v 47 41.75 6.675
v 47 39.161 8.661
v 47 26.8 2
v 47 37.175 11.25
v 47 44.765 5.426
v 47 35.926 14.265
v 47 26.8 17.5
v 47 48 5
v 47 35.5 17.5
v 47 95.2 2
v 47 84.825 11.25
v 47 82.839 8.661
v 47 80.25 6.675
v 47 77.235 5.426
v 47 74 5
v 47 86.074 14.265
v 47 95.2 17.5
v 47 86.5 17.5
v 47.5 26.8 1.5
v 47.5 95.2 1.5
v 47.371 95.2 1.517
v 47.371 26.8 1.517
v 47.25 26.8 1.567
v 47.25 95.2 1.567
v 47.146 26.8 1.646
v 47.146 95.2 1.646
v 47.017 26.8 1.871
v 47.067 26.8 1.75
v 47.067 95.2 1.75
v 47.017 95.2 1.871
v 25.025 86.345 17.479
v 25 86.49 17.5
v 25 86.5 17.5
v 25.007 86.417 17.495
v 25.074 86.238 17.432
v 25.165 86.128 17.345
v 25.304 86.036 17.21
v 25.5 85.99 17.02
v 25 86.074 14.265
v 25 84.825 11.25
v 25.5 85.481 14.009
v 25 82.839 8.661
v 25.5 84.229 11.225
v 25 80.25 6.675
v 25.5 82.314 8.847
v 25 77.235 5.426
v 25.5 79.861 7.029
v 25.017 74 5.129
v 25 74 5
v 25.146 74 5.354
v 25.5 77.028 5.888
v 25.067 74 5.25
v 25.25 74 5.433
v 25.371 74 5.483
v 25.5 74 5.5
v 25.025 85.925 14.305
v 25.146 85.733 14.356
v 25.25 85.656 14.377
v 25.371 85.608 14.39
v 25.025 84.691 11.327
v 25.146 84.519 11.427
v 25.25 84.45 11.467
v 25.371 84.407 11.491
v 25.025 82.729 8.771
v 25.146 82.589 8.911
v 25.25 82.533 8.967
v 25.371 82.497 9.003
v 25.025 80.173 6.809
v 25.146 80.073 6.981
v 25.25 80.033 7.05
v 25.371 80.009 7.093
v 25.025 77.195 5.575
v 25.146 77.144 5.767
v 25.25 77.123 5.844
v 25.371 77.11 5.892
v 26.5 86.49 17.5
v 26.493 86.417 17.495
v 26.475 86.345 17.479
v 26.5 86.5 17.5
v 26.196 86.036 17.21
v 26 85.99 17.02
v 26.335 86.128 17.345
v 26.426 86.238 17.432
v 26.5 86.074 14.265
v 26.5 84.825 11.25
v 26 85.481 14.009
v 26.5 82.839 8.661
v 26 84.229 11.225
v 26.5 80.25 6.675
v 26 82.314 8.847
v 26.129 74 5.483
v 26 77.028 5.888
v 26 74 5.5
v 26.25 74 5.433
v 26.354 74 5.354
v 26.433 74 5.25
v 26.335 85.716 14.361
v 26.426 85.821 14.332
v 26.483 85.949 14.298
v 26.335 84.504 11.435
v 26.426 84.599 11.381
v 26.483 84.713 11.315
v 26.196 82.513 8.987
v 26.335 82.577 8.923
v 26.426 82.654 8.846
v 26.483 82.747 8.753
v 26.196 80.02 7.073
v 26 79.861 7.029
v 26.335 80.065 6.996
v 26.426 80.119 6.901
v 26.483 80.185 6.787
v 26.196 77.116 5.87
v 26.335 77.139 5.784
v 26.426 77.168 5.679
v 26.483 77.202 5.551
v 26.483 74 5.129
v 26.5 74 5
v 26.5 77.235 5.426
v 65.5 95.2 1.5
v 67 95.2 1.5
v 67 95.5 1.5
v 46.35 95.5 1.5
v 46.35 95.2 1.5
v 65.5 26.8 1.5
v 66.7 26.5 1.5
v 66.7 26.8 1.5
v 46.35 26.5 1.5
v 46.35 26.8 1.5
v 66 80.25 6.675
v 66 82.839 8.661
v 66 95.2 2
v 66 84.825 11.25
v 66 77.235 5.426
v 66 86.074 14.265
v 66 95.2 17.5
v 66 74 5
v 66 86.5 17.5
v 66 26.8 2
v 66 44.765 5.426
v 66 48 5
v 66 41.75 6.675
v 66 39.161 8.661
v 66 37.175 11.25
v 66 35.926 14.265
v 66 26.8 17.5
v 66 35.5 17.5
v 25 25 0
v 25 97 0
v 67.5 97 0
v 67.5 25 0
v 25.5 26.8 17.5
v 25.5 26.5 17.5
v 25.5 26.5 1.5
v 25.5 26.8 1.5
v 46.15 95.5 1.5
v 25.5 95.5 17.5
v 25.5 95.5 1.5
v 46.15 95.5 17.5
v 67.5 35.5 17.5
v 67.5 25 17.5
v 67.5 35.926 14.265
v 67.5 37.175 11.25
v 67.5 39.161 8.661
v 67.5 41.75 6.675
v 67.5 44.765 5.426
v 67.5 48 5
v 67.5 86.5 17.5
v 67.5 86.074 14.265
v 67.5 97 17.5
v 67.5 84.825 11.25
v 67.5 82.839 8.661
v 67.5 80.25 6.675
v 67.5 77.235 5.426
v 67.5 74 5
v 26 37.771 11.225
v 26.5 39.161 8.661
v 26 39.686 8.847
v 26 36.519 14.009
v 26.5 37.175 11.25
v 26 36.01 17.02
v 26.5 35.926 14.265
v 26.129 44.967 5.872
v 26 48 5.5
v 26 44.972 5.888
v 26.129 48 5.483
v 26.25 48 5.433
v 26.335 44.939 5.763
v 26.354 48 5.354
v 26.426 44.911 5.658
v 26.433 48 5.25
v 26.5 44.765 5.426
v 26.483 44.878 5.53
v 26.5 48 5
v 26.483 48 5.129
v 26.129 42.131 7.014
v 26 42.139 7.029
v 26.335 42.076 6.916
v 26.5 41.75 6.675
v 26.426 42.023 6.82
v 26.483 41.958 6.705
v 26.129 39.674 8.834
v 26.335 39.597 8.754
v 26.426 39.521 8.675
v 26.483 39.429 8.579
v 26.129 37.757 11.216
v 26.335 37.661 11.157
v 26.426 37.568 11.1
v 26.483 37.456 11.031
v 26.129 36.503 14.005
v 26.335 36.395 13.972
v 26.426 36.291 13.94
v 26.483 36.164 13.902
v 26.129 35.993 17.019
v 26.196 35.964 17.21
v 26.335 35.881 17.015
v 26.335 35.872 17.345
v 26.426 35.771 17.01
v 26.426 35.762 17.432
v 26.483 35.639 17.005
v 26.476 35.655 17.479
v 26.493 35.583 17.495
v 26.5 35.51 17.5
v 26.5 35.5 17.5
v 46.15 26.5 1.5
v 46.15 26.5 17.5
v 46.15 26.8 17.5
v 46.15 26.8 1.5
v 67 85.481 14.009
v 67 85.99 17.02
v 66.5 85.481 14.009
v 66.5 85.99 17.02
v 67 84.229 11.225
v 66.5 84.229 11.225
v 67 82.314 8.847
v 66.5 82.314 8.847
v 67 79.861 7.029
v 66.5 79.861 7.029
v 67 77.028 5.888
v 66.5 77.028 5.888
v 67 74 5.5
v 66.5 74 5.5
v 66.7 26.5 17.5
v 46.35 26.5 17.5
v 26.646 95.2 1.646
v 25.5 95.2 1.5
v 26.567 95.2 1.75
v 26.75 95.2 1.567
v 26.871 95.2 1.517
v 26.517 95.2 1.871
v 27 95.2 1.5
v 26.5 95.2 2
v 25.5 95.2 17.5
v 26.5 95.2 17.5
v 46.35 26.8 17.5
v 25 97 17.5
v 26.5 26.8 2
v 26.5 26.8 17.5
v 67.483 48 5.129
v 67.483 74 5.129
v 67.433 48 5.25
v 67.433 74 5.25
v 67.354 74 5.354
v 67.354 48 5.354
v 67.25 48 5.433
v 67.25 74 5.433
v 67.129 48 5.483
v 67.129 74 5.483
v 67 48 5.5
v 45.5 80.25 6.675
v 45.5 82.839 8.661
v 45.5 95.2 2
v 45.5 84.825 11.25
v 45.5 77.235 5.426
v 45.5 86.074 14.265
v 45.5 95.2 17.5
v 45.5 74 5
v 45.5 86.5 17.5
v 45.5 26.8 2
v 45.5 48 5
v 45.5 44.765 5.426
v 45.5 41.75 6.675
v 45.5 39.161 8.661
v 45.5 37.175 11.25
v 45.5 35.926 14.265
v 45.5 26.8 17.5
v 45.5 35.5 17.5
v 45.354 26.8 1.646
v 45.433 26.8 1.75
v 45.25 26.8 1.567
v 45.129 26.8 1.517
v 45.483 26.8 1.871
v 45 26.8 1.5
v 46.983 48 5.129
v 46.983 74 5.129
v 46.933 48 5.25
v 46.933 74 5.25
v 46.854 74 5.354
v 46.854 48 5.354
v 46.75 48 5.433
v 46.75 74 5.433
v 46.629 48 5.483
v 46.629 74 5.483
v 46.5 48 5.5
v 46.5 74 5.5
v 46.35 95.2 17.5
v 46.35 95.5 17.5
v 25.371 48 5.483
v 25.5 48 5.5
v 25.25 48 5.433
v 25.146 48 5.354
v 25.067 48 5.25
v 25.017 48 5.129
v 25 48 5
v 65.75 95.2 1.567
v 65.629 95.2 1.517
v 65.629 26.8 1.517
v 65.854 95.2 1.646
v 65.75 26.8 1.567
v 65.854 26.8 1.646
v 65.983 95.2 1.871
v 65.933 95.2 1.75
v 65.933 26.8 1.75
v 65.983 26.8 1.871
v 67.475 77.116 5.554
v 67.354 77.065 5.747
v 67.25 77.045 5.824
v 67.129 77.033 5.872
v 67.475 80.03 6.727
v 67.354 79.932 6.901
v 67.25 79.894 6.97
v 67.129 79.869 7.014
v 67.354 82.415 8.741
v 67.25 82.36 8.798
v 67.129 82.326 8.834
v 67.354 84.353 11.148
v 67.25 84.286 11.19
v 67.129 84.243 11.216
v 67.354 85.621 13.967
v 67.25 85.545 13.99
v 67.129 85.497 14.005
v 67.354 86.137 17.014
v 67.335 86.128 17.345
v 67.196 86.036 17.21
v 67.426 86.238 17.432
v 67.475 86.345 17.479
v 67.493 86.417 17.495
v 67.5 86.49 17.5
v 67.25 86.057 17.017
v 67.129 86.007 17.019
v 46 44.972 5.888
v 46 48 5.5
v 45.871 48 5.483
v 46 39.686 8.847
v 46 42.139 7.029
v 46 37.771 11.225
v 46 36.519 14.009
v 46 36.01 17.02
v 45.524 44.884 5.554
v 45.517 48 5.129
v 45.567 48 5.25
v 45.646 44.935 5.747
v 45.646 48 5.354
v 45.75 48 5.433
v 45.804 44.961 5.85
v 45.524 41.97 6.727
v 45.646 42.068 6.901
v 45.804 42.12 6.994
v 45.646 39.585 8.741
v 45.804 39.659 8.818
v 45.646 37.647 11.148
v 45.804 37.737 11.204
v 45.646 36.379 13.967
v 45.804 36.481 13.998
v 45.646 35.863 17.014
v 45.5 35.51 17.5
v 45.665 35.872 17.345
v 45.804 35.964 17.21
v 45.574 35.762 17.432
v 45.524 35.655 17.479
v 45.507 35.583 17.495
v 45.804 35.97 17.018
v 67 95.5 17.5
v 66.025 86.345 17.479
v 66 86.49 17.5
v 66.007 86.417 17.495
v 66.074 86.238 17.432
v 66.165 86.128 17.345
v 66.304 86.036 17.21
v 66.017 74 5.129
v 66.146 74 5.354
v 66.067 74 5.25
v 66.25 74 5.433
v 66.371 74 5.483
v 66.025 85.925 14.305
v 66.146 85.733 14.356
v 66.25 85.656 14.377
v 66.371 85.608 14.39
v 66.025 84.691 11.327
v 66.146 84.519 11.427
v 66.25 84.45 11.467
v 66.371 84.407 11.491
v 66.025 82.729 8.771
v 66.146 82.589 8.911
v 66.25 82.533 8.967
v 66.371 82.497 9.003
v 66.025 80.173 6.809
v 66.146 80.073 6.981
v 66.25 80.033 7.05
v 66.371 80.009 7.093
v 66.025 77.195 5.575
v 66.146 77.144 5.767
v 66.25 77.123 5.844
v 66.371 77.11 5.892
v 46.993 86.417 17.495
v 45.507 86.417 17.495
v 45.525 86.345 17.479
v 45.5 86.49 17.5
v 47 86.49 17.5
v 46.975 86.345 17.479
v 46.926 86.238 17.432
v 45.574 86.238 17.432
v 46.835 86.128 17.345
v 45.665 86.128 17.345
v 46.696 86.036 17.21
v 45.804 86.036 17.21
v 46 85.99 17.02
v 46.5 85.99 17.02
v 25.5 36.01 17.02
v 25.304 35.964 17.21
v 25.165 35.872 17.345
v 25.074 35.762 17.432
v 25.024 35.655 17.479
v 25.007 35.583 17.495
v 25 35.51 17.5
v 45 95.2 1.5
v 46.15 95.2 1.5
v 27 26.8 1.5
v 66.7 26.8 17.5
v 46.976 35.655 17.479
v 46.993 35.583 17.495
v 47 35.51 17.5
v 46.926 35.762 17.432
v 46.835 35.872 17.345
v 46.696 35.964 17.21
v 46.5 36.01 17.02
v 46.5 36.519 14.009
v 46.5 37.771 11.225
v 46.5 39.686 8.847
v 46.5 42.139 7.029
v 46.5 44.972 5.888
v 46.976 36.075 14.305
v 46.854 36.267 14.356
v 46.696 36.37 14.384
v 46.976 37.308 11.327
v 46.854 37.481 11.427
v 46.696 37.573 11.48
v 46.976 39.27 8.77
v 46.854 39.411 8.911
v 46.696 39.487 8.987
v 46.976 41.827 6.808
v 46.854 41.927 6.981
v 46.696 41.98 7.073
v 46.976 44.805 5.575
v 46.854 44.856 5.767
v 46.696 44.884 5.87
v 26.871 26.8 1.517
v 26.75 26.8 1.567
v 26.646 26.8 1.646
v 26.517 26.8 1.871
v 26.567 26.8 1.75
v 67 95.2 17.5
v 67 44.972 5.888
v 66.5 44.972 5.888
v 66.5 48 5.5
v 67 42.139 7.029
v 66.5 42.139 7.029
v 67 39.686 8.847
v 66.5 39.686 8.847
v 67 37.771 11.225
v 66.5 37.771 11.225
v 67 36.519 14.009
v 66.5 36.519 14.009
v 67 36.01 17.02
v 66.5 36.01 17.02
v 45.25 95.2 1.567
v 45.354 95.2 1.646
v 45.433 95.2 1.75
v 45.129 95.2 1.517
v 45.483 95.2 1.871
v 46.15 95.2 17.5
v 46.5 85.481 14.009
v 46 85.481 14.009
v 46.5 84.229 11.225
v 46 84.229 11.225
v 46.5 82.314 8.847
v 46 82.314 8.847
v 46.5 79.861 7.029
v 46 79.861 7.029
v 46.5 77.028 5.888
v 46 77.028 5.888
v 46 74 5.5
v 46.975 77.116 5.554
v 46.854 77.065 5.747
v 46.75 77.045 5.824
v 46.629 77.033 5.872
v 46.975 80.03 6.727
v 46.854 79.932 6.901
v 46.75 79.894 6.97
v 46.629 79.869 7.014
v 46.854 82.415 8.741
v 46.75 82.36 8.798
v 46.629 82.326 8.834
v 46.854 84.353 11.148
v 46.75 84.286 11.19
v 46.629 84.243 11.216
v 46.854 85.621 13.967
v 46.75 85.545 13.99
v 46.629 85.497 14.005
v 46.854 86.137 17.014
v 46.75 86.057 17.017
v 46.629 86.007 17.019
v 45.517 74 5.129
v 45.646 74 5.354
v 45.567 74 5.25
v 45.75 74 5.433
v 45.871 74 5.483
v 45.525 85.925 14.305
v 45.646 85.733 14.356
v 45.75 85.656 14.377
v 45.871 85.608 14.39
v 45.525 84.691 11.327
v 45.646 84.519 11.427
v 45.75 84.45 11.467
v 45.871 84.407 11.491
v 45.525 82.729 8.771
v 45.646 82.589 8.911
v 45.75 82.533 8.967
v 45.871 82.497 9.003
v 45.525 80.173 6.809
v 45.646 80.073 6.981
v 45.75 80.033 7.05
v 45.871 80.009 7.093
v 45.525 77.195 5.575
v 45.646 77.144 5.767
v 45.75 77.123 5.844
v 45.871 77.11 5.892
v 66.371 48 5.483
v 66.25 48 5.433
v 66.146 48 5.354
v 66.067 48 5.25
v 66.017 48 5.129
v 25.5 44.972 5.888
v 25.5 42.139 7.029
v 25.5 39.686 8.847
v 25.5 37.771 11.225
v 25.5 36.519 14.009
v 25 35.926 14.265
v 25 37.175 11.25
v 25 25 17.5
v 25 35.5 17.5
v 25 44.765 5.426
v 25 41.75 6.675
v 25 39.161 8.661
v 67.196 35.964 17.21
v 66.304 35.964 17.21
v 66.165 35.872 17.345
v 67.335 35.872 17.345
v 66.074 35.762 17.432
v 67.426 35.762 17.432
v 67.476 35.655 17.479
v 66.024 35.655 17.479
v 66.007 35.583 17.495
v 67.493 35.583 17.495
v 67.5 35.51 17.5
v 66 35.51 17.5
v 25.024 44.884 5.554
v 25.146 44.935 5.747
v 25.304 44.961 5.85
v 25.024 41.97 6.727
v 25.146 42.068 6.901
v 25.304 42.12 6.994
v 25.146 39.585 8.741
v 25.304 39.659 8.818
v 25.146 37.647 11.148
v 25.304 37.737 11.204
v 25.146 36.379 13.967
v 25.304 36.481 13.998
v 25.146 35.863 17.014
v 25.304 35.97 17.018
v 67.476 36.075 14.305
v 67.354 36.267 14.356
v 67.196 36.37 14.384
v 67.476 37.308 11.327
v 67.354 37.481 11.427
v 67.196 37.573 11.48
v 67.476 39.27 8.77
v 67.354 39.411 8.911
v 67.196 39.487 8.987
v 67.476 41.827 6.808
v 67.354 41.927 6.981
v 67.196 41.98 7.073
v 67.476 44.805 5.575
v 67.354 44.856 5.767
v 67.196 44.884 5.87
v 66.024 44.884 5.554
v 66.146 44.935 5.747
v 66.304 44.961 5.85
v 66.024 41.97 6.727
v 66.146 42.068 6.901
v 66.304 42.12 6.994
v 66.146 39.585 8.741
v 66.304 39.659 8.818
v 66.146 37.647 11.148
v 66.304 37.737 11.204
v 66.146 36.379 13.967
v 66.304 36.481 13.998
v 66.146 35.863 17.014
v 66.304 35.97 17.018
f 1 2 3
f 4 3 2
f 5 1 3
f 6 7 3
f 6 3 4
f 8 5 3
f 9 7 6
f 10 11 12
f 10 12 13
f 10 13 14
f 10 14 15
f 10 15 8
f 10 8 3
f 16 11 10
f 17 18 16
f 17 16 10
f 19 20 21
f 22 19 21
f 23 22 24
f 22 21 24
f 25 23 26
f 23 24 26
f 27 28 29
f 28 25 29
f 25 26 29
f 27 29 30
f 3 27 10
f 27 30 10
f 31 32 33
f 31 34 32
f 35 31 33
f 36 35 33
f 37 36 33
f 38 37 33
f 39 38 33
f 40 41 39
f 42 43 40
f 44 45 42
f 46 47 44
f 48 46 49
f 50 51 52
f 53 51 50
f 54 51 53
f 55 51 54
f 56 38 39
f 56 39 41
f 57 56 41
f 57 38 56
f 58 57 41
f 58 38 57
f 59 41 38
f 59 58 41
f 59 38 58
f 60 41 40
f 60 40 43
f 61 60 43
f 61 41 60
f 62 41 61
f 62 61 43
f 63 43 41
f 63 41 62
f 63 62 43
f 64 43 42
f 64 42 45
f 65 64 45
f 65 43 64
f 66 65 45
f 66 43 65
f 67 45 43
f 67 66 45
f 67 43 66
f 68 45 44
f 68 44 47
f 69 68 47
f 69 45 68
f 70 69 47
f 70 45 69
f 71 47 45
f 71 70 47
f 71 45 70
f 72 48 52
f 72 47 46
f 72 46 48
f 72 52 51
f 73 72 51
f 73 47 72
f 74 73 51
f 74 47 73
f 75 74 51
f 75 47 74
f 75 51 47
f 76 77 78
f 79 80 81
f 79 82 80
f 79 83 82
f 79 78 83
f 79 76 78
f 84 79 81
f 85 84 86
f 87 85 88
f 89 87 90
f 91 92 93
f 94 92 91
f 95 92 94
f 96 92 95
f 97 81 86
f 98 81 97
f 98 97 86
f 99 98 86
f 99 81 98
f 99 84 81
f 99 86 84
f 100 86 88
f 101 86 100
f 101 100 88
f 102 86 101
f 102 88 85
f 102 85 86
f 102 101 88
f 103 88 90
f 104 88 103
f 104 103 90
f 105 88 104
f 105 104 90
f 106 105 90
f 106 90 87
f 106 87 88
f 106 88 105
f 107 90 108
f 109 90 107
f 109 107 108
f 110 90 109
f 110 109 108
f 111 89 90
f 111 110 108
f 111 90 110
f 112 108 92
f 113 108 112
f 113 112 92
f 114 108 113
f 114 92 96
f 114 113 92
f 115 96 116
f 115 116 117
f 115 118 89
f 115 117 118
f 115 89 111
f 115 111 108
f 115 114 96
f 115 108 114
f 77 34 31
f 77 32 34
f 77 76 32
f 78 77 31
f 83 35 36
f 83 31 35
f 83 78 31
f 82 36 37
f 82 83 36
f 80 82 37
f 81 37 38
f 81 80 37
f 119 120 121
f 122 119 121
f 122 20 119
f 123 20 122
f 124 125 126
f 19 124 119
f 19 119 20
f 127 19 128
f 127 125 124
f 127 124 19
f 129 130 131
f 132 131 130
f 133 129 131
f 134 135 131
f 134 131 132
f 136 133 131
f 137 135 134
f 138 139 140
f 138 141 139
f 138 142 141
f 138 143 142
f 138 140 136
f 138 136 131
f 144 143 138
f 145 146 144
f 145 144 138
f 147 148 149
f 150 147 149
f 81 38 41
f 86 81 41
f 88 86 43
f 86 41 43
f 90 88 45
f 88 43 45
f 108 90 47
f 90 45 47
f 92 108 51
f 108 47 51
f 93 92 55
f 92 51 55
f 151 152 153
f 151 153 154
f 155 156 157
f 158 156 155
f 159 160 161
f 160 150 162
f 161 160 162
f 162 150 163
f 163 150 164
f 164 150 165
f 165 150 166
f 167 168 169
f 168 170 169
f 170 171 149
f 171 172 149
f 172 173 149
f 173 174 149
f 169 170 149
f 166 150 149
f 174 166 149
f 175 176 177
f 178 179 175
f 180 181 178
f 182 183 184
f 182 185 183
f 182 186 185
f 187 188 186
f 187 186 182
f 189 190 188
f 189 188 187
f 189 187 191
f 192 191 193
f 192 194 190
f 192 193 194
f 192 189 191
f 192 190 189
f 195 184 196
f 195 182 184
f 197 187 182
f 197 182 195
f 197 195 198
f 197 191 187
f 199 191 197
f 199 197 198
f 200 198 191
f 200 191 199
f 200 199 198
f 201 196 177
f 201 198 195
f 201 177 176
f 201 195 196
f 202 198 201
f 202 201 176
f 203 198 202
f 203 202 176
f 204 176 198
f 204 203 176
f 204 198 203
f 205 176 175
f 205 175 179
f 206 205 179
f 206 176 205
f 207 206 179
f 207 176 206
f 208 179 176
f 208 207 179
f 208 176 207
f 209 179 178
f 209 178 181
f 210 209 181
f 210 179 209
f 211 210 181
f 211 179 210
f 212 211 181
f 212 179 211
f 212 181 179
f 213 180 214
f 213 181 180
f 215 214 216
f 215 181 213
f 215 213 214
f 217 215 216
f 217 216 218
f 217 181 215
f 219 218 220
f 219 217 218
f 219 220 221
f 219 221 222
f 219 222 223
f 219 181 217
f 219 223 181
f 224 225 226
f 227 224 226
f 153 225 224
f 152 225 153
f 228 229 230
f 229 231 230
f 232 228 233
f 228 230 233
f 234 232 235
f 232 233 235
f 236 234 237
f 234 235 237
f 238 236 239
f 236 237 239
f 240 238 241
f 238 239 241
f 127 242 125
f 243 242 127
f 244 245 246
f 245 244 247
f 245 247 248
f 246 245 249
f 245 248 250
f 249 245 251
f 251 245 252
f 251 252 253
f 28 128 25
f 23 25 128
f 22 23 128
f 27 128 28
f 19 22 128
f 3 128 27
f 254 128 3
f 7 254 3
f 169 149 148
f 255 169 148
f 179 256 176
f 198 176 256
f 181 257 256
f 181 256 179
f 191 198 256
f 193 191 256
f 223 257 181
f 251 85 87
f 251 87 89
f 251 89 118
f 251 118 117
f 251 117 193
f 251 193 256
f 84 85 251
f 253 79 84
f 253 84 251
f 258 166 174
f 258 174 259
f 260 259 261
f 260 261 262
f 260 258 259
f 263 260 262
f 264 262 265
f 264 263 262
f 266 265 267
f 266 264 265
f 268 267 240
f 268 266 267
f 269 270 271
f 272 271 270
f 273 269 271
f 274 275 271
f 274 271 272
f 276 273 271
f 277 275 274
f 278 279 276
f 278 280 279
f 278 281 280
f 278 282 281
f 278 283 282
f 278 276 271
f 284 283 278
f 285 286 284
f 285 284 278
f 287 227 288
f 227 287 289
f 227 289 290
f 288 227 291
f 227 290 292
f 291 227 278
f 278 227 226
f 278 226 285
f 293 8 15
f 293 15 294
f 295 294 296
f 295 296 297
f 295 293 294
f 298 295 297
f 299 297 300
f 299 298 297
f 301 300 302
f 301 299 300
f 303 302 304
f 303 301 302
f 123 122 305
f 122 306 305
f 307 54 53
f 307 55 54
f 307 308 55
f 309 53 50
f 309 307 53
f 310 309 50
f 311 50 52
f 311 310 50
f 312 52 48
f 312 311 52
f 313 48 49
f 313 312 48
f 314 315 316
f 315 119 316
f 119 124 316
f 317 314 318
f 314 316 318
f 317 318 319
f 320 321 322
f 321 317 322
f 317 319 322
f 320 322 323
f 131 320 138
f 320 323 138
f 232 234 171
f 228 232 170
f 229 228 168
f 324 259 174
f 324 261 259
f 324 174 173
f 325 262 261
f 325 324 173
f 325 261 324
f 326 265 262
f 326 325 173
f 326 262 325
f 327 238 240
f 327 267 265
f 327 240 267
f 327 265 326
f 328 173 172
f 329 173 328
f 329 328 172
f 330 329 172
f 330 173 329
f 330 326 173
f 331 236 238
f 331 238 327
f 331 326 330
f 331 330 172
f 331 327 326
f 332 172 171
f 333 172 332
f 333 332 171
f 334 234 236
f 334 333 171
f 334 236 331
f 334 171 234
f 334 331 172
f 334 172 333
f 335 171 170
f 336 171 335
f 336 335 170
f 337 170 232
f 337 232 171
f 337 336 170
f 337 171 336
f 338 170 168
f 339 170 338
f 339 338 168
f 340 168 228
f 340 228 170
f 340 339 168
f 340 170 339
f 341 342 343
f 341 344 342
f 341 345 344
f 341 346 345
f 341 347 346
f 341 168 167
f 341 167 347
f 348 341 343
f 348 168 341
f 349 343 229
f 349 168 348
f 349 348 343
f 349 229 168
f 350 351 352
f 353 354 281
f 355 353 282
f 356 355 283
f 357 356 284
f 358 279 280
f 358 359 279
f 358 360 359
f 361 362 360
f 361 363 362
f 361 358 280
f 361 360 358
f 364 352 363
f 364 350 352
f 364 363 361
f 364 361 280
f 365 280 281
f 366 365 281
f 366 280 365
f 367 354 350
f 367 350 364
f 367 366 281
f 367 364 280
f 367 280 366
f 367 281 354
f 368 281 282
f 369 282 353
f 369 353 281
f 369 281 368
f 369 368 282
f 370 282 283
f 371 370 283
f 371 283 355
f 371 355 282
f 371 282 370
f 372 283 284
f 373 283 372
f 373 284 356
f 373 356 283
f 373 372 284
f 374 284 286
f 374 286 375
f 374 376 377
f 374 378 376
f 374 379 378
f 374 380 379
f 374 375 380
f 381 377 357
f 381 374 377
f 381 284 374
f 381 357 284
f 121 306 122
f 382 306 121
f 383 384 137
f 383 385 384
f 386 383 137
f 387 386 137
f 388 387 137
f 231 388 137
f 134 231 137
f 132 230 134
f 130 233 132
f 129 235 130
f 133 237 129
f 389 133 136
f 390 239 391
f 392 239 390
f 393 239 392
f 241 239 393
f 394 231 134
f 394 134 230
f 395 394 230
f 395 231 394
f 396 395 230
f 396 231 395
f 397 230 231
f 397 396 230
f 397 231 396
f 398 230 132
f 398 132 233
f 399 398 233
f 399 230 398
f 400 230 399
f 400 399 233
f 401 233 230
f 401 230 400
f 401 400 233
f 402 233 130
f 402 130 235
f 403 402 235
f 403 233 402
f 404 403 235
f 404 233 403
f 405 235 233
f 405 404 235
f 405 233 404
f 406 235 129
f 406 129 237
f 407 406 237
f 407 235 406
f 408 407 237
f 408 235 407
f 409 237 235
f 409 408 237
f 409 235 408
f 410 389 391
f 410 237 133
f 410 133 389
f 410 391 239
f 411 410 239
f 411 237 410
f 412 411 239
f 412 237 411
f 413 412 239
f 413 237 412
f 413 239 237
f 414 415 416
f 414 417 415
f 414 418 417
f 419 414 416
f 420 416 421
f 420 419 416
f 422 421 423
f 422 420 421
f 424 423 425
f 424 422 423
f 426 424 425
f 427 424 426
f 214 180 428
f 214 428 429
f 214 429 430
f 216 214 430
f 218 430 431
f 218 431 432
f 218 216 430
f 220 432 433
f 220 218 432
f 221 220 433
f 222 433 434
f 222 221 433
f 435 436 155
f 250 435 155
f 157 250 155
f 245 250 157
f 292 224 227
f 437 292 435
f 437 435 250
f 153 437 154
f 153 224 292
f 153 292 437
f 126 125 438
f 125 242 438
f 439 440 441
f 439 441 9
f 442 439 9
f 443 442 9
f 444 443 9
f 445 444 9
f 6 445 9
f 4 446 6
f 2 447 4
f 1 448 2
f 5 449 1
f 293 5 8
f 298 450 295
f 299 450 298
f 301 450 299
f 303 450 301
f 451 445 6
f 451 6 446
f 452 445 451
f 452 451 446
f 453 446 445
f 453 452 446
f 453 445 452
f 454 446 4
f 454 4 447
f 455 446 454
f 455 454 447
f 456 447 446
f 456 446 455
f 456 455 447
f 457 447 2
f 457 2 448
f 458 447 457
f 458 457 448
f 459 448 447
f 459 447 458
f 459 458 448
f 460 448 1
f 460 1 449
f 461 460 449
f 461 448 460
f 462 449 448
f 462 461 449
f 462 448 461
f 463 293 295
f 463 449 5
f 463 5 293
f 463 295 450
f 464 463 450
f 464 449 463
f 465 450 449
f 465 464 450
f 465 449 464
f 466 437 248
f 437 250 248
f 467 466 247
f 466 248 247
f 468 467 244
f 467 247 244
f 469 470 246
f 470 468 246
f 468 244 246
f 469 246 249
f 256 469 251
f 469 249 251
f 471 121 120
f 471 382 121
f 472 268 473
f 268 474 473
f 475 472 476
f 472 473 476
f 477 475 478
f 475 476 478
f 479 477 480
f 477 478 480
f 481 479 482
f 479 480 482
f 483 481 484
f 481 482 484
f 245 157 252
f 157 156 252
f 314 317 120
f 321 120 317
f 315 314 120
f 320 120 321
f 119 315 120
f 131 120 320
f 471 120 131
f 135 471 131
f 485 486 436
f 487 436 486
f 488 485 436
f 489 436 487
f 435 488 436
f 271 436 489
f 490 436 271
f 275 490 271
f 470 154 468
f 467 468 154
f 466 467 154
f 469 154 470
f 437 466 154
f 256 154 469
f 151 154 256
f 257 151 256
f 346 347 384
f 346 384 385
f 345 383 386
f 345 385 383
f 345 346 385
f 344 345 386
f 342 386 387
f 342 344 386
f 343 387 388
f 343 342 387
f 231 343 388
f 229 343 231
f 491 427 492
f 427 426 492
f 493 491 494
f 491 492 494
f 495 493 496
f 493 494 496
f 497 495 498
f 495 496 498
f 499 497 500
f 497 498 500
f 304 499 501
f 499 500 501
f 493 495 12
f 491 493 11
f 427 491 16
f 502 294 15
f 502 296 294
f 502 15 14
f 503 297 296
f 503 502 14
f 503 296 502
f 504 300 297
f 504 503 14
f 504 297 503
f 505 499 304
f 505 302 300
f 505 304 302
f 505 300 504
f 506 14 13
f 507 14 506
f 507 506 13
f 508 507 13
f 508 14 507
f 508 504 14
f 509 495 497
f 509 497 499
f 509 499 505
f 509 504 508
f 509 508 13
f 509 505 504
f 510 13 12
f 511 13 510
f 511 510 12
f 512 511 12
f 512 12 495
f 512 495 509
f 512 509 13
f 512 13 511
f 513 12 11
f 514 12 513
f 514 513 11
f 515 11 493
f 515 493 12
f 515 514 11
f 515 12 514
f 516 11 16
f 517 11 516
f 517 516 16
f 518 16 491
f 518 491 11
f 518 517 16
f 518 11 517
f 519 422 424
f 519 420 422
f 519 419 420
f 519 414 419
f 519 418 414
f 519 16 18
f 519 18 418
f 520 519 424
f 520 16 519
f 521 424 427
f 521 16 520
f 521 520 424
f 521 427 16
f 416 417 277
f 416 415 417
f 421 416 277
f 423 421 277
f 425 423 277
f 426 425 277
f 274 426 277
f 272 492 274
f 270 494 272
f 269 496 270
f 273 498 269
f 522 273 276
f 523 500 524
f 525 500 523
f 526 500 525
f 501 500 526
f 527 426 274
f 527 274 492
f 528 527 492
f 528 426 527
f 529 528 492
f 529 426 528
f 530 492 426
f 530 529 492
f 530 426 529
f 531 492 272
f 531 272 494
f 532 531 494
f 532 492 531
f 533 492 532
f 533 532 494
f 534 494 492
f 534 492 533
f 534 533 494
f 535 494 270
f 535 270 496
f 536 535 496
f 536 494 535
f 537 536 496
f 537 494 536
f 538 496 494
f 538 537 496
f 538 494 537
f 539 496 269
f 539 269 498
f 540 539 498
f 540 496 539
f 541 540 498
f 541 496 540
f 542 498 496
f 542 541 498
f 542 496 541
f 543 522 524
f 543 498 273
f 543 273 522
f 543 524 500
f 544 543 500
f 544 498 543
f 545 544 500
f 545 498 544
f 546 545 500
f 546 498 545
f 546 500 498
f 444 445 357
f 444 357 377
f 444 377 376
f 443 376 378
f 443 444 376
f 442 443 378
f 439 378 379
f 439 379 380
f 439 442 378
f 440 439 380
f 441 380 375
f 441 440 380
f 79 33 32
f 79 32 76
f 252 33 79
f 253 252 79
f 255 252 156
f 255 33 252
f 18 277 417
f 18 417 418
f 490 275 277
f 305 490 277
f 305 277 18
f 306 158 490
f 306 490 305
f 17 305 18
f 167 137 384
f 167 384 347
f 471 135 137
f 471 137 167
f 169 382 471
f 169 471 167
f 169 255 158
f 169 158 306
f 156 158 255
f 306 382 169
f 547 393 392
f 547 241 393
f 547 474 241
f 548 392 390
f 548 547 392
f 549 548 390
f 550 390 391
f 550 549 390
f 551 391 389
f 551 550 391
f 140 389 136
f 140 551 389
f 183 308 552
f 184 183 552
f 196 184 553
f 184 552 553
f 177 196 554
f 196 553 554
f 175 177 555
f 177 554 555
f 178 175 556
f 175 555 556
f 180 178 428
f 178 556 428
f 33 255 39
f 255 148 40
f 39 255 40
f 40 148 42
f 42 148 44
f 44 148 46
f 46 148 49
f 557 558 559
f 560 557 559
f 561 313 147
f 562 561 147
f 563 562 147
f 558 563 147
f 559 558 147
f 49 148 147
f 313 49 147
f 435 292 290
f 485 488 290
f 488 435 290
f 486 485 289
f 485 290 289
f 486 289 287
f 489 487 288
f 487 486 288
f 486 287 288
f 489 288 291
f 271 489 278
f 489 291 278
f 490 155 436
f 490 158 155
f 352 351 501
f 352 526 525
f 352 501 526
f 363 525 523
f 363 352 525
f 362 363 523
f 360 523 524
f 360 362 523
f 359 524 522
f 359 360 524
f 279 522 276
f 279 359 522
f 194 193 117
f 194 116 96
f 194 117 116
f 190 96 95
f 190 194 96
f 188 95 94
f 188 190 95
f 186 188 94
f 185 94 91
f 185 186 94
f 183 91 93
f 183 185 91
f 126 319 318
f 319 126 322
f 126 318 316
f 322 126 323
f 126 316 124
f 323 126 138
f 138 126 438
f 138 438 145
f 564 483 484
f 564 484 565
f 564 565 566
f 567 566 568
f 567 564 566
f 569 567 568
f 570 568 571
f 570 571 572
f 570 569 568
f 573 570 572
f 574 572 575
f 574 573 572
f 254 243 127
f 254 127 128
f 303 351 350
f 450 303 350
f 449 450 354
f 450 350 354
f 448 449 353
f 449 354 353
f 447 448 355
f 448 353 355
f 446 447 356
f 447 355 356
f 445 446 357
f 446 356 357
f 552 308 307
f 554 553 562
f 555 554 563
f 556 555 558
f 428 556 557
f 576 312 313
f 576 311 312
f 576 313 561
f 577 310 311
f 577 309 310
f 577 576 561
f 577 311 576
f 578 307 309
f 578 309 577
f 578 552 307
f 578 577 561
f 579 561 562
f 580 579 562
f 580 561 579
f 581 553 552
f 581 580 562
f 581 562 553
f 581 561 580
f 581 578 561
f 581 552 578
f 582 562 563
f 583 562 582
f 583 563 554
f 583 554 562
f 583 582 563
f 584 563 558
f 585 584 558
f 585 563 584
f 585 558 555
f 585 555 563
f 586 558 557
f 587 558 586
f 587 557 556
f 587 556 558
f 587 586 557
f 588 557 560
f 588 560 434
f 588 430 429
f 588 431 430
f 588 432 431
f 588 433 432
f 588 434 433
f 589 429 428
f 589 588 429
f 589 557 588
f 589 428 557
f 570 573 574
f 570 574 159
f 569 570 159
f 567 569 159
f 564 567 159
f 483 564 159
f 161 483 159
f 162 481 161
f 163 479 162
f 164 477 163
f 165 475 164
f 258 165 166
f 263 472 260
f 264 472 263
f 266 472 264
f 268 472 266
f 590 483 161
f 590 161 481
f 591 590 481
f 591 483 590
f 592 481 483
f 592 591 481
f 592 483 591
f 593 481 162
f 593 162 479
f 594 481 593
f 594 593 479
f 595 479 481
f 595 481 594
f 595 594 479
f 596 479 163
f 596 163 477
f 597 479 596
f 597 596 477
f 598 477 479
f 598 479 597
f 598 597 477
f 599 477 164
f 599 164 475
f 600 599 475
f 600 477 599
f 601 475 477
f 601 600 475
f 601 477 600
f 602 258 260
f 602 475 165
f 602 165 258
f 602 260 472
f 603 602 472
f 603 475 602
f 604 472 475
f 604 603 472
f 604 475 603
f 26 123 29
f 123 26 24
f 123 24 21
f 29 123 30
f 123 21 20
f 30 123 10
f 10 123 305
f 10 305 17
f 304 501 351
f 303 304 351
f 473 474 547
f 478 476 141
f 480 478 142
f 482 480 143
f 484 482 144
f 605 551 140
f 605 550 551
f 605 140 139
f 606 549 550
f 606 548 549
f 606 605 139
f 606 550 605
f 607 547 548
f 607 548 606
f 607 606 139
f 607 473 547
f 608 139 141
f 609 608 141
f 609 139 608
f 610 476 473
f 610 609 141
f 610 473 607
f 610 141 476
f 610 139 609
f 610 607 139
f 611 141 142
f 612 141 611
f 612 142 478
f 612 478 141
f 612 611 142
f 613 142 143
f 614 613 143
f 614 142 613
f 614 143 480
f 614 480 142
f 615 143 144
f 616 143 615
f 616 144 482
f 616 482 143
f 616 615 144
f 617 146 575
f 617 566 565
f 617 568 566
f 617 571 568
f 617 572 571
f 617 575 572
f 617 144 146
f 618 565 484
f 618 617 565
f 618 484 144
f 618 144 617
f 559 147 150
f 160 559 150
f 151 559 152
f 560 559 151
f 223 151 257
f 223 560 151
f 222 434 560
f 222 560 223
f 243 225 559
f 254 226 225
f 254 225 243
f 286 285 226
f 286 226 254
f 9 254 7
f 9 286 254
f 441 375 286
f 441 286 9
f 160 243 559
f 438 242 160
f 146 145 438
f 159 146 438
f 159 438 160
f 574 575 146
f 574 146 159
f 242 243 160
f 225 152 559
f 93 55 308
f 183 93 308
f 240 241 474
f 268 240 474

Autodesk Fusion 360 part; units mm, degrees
sketch "Sketch1" plane through (0, 0, 0) normal (0, 0, 1) x (1, 0, 0)
  line L0 (25, 25) -> (67.5, 25)
  line L1 (67.5, 25) -> (67.5, 97)
  line L2 (67.5, 97) -> (25, 97)
  line L3 (25, 97) -> (25, 25)
  dimension "d1" = 42.5
  dimension "d2" = 72
extrude "Extrude1" add sketch "Sketch1" along normal blind 17.5
sketch "Sketch2" plane through (0, 0, 17.5) normal (0, 0, 1) x (-1, 0, 0)
  line L0 (-25, -97) -> (-25, -25)
  line L1 (-25, -25) -> (-67.5, -25)
  line L2 (-67.5, -25) -> (-67.5, -97)
  line L3 (-67.5, -97) -> (-25, -97)
  line L4 (-25, -97) -> (-26.5, -97)
  line L5 (-26.5, -97) -> (-26.5, -95.5)
  line L6 (-26.5, -95.5) -> (-25, -95.5)
  line L7 (-25, -95.5) -> (-25, -97)
  line L8 (-67.5, -25) -> (-66, -25)
  line L9 (-66, -25) -> (-66, -26.5)
  line L10 (-66, -26.5) -> (-67.5, -26.5)
  line L11 (-67.5, -26.5) -> (-67.5, -25)
  line L12 (-47, -25) -> (-45.5, -25) construction
  line L13 (-45.5, -25) -> (-45.5, -26.5) construction
  line L14 (-45.5, -26.5) -> (-47, -26.5) construction
  line L15 (-47, -26.5) -> (-47, -25) construction
  line L16 (-26.5, -95.5) -> (-45.5, -95.5)
  line L17 (-45.5, -95.5) -> (-45.5, -26.5)
  line L18 (-45.5, -26.5) -> (-26.5, -26.5)
  line L19 (-26.5, -26.5) -> (-26.5, -95.5)
  line L20 (-45.5, -97) -> (-47, -97)
  line L21 (-47, -97) -> (-47, -95.5)
  line L22 (-47, -95.5) -> (-45.5, -95.5)
  line L23 (-45.5, -95.5) -> (-45.5, -97)
  line L24 (-47, -95.5) -> (-66, -95.5)
  line L25 (-66, -95.5) -> (-66, -26.5)
  line L26 (-66, -26.5) -> (-47, -26.5)
  line L27 (-47, -26.5) -> (-47, -95.5)
  point P0 (-47, -25)
  point P1 (-45.5, -97)
  dimension "d5" = 1.5
  dimension "d6" = 1.5
  dimension "d7" = 1.5
  dimension "d8" = 1.5
  dimension "d9" = 22
  dimension "d10" = 1.5
  dimension "d11" = 1.5
  dimension "d12" = 22
  dimension "d15" = 1.5
  dimension "d16" = 1.5
extrude "Extrude2" cut sketch "Sketch2" against normal blind 16 contours L16 L17 L18 L19 | L24 L25 L26 L27
sketch "Sketch3" plane through (25, 0, 0) normal (-1, 0, 0) x (0, -1, 0)
  line L0 (-97, 0) -> (-25, 0)
  line L1 (-25, 0) -> (-25, 17.5)
  line L2 (-25, 17.5) -> (-97, 17.5)
  line L3 (-97, 17.5) -> (-97, 0)
  line L4 (-61, 0) -> (-61, 17.5) construction
  line L5 (-74, 5.5) -> (-48, 5.5)
  arc A0 (-48, 5.5) -> (-48, 29.5) centre (-48, 17.5) ccw
  line L6 (-48, 29.5) -> (-74, 29.5)
  arc A1 (-74, 29.5) -> (-74, 5.5) centre (-74, 17.5) ccw
  line L7 (-86, 17.5) -> (-36, 17.5) construction
  point P0 (-36, 17.5)
  point P1 (-86, 17.5)
  dimension "d19" = 25
  dimension "d20" = 25
  dimension "d21" = 24
extrude "Extrude3" cut sketch "Sketch3" against normal blind 42.5 contours L2 L5 A0 A1
fillet "Fillet1" radius 0.5 24 edges at (25, 39.5147, 9.0147) (25, 61, 5.5) (25, 82.4853, 9.0147) (45.5, 39.5147, 9.0147) (45.5, 61, 5.5) (45.5, 82.4853, 9.0147) (66, 39.5147, 9.0147) (66, 61, 5.5) (66, 82.4853, 9.0147) (26.5, 82.4853, 9.0147) (26.5, 61, 5.5) (26.5, 39.5147, 9.0147) (47, 82.4853, 9.0147) (47, 61, 5.5) (47, 39.5147, 9.0147) (67.5, 82.4853, 9.0147) (67.5, 61, 5.5) (67.5, 39.5147, 9.0147) (66.75, 36, 17.5) (46.25, 36, 17.5) (25.75, 36, 17.5) (25.75, 86, 17.5) (46.25, 86, 17.5) (66.75, 86, 17.5)
sketch "Sketch4" plane through (0, 0, 17.5) normal (0, 0, 1) x (-1, 0, 0)
  arc A0 (-67.4999, -86.49) -> (-67.5, -86.5) centre (-67, -86.5) ccw
  line L0 (-67.5, -86.5) -> (-67.5, -97)
  line L1 (-67.5, -97) -> (-25, -97)
  line L2 (-25, -97) -> (-25, -86.5)
  arc A1 (-25, -86.5) -> (-25.0001, -86.49) centre (-25.5, -86.5) ccw
  line L3 (-25.0001, -86.49) -> (-26.4999, -86.49)
  arc A2 (-26.4999, -86.49) -> (-26.5, -86.5) centre (-26, -86.5) ccw
  line L4 (-26.5, -86.5) -> (-26.5, -95.5)
  line L5 (-26.5, -95.5) -> (-45.5, -95.5)
  line L6 (-45.5, -95.5) -> (-45.5, -86.5)
  arc A3 (-45.5, -86.5) -> (-45.5001, -86.49) centre (-46, -86.5) ccw
  line L7 (-45.5001, -86.49) -> (-46.9999, -86.49)
  arc A4 (-46.9999, -86.49) -> (-47, -86.5) centre (-46.5, -86.5) ccw
  line L8 (-47, -86.5) -> (-47, -95.5)
  line L9 (-47, -95.5) -> (-66, -95.5)
  line L10 (-66, -95.5) -> (-66, -86.5)
  arc A5 (-66, -86.5) -> (-66.0001, -86.49) centre (-66.5, -86.5) ccw
  line L11 (-66.0001, -86.49) -> (-67.4999, -86.49)
  line L12 (-26.5, -95.5) -> (-25.5, -95.5)
  line L13 (-25.5, -95.5) -> (-25.5, -95.2)
  line L14 (-25.5, -95.2) -> (-26.5, -95.2)
  line L15 (-26.5, -95.2) -> (-26.5, -95.5)
  line L16 (-66, -95.5) -> (-67, -95.5)
  line L17 (-67, -95.5) -> (-67, -95.2)
  line L18 (-67, -95.2) -> (-66, -95.2)
  line L19 (-66, -95.2) -> (-66, -95.5)
  line L20 (-45.5, -95.5) -> (-46.15, -95.5)
  line L21 (-46.15, -95.5) -> (-46.15, -95.2)
  line L22 (-46.15, -95.2) -> (-45.5, -95.2)
  line L23 (-45.5, -95.2) -> (-45.5, -95.5)
  line L24 (-47, -95.5) -> (-46.35, -95.5)
  line L25 (-46.35, -95.5) -> (-46.35, -95.2)
  line L26 (-46.35, -95.2) -> (-47, -95.2)
  line L27 (-47, -95.2) -> (-47, -95.5)
  dimension "d25" = 1
  dimension "d26" = 0.3
  dimension "d27" = 1
  dimension "d28" = 0.3
  dimension "d29" = 0.65
  dimension "d30" = 0.3
  dimension "d42" = 0.65
  dimension "d43" = 0.3
sketch "Sketch5" plane through (0, 0, 17.5) normal (0, 0, 1) x (-1, 0, 0)
  arc A0 (-67.5, -35.5) -> (-67.4999, -35.51) centre (-67, -35.5) ccw
  line L0 (-67.4999, -35.51) -> (-66.0001, -35.51)
  arc A1 (-66.0001, -35.51) -> (-66, -35.5) centre (-66.5, -35.5) ccw
  line L1 (-66, -35.5) -> (-66, -26.5)
  line L2 (-66, -26.5) -> (-47, -26.5)
  line L3 (-47, -26.5) -> (-47, -35.5)
  arc A2 (-47, -35.5) -> (-46.9999, -35.51) centre (-46.5, -35.5) ccw
  line L4 (-46.9999, -35.51) -> (-45.5001, -35.51)
  arc A3 (-45.5001, -35.51) -> (-45.5, -35.5) centre (-46, -35.5) ccw
  line L5 (-45.5, -35.5) -> (-45.5, -26.5)
  line L6 (-45.5, -26.5) -> (-26.5, -26.5)
  line L7 (-26.5, -26.5) -> (-26.5, -35.5)
  arc A4 (-26.5, -35.5) -> (-26.4999, -35.51) centre (-26, -35.5) ccw
  line L8 (-26.4999, -35.51) -> (-25.0001, -35.51)
  arc A5 (-25.0001, -35.51) -> (-25, -35.5) centre (-25.5, -35.5) ccw
  line L9 (-25, -35.5) -> (-25, -25)
  line L10 (-25, -25) -> (-67.5, -25)
  line L11 (-67.5, -25) -> (-67.5, -35.5)
  line L12 (-26.5, -26.5) -> (-25.5, -26.5)
  line L13 (-25.5, -26.5) -> (-25.5, -26.8)
  line L14 (-25.5, -26.8) -> (-26.5, -26.8)
  line L15 (-26.5, -26.8) -> (-26.5, -26.5)
  line L16 (-45.5, -26.5) -> (-46.15, -26.5)
  line L17 (-46.15, -26.5) -> (-46.15, -26.8)
  line L18 (-46.15, -26.8) -> (-45.5, -26.8)
  line L19 (-45.5, -26.8) -> (-45.5, -26.5)
  line L20 (-47, -26.5) -> (-46.35, -26.5)
  line L21 (-46.35, -26.5) -> (-46.35, -26.8)
  line L22 (-46.35, -26.8) -> (-47, -26.8)
  line L23 (-47, -26.8) -> (-47, -26.5)
  line L24 (-66, -26.5) -> (-66.7, -26.5)
  line L25 (-66.7, -26.5) -> (-66.7, -26.8)
  line L26 (-66.7, -26.8) -> (-66, -26.8)
  line L27 (-66, -26.8) -> (-66, -26.5)
  dimension "d31" = 1
  dimension "d32" = 0.3
  dimension "d33" = 0.65
  dimension "d34" = 0.3
  dimension "d35" = 0.65
  dimension "d36" = 0.3
  dimension "d37" = 0.7
  dimension "d38" = 0.3
extrude "Extrude4" cut sketch "Sketch4" sketch "Sketch5" against normal blind 16 contours L10 L16 L17 L18 L19 | L8 L24 L25 L26 L27 | L4 L12 L13 L14 L15 | L6 L20 L21 L22 L23 of sketch 2 contours L1 L24 L25 L26 L27 | L3 L20 L21 L22 L23 | L7 L12 L13 L14 L15 | L5 L16 L17 L18 L19
fillet "Fillet2" radius 0.5 4 edges at (26.5, 61, 1.5) (45.5, 61, 1.5) (47, 61, 1.5) (66, 61, 1.5)
